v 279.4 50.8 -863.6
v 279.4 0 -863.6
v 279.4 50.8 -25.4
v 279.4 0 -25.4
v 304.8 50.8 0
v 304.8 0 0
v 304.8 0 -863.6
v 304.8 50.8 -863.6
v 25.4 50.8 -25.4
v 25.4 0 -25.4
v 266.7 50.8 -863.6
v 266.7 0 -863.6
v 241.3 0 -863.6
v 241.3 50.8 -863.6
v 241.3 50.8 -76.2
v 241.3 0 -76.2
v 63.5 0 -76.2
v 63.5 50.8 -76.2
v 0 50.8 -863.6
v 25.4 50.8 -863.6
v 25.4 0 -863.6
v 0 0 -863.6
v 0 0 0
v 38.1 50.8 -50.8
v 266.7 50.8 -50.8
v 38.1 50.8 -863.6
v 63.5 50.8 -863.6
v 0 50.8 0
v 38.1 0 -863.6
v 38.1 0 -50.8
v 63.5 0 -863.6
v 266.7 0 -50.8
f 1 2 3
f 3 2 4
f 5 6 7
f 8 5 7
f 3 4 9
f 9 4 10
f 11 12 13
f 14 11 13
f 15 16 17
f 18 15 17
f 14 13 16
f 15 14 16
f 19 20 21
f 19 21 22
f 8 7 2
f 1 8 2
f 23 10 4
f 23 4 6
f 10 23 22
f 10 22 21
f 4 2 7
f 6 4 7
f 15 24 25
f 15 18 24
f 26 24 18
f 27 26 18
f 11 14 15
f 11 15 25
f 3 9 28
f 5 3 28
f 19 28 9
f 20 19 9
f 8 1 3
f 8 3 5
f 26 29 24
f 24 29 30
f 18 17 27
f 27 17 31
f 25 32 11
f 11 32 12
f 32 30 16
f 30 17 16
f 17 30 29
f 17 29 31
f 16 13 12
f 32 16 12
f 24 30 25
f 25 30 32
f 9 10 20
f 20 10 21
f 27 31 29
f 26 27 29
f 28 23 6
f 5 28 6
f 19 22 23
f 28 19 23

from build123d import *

# Parameters (mm, degrees)
BOSS_EXTRUDE1_DEPTH   = 50.8
BOSS_EXTRUDE1_2_DEPTH = 50.8


with BuildPart() as part:
    # Sketch1 → Boss-Extrude1 (new body)
    with BuildSketch(Plane(origin=(0, 0, 0), x_dir=(1, 0, 0), z_dir=(0, 1, 0))):
        Polygon((0, 863.6), (0, 0), (304.8, 0), (304.8, 863.6), (279.4, 863.6), (279.4, 25.4), (25.4, 25.4), (25.4, 863.6), align=None)
    extrude(amount=BOSS_EXTRUDE1_DEPTH)


with BuildPart() as body_2:
    # Sketch1 → Boss-Extrude1 2 (new body)
    with BuildSketch(Plane(origin=(0, 0, 0), x_dir=(1, 0, 0), z_dir=(0, 1, 0))):
        Polygon((63.5, 863.6), (38.1, 863.6), (38.1, 50.8), (266.7, 50.8), (266.7, 863.6), (241.3, 863.6), (241.3, 76.2), (63.5, 76.2), align=None)
    extrude(amount=BOSS_EXTRUDE1_2_DEPTH)


solid = Compound([part.part, body_2.part])
